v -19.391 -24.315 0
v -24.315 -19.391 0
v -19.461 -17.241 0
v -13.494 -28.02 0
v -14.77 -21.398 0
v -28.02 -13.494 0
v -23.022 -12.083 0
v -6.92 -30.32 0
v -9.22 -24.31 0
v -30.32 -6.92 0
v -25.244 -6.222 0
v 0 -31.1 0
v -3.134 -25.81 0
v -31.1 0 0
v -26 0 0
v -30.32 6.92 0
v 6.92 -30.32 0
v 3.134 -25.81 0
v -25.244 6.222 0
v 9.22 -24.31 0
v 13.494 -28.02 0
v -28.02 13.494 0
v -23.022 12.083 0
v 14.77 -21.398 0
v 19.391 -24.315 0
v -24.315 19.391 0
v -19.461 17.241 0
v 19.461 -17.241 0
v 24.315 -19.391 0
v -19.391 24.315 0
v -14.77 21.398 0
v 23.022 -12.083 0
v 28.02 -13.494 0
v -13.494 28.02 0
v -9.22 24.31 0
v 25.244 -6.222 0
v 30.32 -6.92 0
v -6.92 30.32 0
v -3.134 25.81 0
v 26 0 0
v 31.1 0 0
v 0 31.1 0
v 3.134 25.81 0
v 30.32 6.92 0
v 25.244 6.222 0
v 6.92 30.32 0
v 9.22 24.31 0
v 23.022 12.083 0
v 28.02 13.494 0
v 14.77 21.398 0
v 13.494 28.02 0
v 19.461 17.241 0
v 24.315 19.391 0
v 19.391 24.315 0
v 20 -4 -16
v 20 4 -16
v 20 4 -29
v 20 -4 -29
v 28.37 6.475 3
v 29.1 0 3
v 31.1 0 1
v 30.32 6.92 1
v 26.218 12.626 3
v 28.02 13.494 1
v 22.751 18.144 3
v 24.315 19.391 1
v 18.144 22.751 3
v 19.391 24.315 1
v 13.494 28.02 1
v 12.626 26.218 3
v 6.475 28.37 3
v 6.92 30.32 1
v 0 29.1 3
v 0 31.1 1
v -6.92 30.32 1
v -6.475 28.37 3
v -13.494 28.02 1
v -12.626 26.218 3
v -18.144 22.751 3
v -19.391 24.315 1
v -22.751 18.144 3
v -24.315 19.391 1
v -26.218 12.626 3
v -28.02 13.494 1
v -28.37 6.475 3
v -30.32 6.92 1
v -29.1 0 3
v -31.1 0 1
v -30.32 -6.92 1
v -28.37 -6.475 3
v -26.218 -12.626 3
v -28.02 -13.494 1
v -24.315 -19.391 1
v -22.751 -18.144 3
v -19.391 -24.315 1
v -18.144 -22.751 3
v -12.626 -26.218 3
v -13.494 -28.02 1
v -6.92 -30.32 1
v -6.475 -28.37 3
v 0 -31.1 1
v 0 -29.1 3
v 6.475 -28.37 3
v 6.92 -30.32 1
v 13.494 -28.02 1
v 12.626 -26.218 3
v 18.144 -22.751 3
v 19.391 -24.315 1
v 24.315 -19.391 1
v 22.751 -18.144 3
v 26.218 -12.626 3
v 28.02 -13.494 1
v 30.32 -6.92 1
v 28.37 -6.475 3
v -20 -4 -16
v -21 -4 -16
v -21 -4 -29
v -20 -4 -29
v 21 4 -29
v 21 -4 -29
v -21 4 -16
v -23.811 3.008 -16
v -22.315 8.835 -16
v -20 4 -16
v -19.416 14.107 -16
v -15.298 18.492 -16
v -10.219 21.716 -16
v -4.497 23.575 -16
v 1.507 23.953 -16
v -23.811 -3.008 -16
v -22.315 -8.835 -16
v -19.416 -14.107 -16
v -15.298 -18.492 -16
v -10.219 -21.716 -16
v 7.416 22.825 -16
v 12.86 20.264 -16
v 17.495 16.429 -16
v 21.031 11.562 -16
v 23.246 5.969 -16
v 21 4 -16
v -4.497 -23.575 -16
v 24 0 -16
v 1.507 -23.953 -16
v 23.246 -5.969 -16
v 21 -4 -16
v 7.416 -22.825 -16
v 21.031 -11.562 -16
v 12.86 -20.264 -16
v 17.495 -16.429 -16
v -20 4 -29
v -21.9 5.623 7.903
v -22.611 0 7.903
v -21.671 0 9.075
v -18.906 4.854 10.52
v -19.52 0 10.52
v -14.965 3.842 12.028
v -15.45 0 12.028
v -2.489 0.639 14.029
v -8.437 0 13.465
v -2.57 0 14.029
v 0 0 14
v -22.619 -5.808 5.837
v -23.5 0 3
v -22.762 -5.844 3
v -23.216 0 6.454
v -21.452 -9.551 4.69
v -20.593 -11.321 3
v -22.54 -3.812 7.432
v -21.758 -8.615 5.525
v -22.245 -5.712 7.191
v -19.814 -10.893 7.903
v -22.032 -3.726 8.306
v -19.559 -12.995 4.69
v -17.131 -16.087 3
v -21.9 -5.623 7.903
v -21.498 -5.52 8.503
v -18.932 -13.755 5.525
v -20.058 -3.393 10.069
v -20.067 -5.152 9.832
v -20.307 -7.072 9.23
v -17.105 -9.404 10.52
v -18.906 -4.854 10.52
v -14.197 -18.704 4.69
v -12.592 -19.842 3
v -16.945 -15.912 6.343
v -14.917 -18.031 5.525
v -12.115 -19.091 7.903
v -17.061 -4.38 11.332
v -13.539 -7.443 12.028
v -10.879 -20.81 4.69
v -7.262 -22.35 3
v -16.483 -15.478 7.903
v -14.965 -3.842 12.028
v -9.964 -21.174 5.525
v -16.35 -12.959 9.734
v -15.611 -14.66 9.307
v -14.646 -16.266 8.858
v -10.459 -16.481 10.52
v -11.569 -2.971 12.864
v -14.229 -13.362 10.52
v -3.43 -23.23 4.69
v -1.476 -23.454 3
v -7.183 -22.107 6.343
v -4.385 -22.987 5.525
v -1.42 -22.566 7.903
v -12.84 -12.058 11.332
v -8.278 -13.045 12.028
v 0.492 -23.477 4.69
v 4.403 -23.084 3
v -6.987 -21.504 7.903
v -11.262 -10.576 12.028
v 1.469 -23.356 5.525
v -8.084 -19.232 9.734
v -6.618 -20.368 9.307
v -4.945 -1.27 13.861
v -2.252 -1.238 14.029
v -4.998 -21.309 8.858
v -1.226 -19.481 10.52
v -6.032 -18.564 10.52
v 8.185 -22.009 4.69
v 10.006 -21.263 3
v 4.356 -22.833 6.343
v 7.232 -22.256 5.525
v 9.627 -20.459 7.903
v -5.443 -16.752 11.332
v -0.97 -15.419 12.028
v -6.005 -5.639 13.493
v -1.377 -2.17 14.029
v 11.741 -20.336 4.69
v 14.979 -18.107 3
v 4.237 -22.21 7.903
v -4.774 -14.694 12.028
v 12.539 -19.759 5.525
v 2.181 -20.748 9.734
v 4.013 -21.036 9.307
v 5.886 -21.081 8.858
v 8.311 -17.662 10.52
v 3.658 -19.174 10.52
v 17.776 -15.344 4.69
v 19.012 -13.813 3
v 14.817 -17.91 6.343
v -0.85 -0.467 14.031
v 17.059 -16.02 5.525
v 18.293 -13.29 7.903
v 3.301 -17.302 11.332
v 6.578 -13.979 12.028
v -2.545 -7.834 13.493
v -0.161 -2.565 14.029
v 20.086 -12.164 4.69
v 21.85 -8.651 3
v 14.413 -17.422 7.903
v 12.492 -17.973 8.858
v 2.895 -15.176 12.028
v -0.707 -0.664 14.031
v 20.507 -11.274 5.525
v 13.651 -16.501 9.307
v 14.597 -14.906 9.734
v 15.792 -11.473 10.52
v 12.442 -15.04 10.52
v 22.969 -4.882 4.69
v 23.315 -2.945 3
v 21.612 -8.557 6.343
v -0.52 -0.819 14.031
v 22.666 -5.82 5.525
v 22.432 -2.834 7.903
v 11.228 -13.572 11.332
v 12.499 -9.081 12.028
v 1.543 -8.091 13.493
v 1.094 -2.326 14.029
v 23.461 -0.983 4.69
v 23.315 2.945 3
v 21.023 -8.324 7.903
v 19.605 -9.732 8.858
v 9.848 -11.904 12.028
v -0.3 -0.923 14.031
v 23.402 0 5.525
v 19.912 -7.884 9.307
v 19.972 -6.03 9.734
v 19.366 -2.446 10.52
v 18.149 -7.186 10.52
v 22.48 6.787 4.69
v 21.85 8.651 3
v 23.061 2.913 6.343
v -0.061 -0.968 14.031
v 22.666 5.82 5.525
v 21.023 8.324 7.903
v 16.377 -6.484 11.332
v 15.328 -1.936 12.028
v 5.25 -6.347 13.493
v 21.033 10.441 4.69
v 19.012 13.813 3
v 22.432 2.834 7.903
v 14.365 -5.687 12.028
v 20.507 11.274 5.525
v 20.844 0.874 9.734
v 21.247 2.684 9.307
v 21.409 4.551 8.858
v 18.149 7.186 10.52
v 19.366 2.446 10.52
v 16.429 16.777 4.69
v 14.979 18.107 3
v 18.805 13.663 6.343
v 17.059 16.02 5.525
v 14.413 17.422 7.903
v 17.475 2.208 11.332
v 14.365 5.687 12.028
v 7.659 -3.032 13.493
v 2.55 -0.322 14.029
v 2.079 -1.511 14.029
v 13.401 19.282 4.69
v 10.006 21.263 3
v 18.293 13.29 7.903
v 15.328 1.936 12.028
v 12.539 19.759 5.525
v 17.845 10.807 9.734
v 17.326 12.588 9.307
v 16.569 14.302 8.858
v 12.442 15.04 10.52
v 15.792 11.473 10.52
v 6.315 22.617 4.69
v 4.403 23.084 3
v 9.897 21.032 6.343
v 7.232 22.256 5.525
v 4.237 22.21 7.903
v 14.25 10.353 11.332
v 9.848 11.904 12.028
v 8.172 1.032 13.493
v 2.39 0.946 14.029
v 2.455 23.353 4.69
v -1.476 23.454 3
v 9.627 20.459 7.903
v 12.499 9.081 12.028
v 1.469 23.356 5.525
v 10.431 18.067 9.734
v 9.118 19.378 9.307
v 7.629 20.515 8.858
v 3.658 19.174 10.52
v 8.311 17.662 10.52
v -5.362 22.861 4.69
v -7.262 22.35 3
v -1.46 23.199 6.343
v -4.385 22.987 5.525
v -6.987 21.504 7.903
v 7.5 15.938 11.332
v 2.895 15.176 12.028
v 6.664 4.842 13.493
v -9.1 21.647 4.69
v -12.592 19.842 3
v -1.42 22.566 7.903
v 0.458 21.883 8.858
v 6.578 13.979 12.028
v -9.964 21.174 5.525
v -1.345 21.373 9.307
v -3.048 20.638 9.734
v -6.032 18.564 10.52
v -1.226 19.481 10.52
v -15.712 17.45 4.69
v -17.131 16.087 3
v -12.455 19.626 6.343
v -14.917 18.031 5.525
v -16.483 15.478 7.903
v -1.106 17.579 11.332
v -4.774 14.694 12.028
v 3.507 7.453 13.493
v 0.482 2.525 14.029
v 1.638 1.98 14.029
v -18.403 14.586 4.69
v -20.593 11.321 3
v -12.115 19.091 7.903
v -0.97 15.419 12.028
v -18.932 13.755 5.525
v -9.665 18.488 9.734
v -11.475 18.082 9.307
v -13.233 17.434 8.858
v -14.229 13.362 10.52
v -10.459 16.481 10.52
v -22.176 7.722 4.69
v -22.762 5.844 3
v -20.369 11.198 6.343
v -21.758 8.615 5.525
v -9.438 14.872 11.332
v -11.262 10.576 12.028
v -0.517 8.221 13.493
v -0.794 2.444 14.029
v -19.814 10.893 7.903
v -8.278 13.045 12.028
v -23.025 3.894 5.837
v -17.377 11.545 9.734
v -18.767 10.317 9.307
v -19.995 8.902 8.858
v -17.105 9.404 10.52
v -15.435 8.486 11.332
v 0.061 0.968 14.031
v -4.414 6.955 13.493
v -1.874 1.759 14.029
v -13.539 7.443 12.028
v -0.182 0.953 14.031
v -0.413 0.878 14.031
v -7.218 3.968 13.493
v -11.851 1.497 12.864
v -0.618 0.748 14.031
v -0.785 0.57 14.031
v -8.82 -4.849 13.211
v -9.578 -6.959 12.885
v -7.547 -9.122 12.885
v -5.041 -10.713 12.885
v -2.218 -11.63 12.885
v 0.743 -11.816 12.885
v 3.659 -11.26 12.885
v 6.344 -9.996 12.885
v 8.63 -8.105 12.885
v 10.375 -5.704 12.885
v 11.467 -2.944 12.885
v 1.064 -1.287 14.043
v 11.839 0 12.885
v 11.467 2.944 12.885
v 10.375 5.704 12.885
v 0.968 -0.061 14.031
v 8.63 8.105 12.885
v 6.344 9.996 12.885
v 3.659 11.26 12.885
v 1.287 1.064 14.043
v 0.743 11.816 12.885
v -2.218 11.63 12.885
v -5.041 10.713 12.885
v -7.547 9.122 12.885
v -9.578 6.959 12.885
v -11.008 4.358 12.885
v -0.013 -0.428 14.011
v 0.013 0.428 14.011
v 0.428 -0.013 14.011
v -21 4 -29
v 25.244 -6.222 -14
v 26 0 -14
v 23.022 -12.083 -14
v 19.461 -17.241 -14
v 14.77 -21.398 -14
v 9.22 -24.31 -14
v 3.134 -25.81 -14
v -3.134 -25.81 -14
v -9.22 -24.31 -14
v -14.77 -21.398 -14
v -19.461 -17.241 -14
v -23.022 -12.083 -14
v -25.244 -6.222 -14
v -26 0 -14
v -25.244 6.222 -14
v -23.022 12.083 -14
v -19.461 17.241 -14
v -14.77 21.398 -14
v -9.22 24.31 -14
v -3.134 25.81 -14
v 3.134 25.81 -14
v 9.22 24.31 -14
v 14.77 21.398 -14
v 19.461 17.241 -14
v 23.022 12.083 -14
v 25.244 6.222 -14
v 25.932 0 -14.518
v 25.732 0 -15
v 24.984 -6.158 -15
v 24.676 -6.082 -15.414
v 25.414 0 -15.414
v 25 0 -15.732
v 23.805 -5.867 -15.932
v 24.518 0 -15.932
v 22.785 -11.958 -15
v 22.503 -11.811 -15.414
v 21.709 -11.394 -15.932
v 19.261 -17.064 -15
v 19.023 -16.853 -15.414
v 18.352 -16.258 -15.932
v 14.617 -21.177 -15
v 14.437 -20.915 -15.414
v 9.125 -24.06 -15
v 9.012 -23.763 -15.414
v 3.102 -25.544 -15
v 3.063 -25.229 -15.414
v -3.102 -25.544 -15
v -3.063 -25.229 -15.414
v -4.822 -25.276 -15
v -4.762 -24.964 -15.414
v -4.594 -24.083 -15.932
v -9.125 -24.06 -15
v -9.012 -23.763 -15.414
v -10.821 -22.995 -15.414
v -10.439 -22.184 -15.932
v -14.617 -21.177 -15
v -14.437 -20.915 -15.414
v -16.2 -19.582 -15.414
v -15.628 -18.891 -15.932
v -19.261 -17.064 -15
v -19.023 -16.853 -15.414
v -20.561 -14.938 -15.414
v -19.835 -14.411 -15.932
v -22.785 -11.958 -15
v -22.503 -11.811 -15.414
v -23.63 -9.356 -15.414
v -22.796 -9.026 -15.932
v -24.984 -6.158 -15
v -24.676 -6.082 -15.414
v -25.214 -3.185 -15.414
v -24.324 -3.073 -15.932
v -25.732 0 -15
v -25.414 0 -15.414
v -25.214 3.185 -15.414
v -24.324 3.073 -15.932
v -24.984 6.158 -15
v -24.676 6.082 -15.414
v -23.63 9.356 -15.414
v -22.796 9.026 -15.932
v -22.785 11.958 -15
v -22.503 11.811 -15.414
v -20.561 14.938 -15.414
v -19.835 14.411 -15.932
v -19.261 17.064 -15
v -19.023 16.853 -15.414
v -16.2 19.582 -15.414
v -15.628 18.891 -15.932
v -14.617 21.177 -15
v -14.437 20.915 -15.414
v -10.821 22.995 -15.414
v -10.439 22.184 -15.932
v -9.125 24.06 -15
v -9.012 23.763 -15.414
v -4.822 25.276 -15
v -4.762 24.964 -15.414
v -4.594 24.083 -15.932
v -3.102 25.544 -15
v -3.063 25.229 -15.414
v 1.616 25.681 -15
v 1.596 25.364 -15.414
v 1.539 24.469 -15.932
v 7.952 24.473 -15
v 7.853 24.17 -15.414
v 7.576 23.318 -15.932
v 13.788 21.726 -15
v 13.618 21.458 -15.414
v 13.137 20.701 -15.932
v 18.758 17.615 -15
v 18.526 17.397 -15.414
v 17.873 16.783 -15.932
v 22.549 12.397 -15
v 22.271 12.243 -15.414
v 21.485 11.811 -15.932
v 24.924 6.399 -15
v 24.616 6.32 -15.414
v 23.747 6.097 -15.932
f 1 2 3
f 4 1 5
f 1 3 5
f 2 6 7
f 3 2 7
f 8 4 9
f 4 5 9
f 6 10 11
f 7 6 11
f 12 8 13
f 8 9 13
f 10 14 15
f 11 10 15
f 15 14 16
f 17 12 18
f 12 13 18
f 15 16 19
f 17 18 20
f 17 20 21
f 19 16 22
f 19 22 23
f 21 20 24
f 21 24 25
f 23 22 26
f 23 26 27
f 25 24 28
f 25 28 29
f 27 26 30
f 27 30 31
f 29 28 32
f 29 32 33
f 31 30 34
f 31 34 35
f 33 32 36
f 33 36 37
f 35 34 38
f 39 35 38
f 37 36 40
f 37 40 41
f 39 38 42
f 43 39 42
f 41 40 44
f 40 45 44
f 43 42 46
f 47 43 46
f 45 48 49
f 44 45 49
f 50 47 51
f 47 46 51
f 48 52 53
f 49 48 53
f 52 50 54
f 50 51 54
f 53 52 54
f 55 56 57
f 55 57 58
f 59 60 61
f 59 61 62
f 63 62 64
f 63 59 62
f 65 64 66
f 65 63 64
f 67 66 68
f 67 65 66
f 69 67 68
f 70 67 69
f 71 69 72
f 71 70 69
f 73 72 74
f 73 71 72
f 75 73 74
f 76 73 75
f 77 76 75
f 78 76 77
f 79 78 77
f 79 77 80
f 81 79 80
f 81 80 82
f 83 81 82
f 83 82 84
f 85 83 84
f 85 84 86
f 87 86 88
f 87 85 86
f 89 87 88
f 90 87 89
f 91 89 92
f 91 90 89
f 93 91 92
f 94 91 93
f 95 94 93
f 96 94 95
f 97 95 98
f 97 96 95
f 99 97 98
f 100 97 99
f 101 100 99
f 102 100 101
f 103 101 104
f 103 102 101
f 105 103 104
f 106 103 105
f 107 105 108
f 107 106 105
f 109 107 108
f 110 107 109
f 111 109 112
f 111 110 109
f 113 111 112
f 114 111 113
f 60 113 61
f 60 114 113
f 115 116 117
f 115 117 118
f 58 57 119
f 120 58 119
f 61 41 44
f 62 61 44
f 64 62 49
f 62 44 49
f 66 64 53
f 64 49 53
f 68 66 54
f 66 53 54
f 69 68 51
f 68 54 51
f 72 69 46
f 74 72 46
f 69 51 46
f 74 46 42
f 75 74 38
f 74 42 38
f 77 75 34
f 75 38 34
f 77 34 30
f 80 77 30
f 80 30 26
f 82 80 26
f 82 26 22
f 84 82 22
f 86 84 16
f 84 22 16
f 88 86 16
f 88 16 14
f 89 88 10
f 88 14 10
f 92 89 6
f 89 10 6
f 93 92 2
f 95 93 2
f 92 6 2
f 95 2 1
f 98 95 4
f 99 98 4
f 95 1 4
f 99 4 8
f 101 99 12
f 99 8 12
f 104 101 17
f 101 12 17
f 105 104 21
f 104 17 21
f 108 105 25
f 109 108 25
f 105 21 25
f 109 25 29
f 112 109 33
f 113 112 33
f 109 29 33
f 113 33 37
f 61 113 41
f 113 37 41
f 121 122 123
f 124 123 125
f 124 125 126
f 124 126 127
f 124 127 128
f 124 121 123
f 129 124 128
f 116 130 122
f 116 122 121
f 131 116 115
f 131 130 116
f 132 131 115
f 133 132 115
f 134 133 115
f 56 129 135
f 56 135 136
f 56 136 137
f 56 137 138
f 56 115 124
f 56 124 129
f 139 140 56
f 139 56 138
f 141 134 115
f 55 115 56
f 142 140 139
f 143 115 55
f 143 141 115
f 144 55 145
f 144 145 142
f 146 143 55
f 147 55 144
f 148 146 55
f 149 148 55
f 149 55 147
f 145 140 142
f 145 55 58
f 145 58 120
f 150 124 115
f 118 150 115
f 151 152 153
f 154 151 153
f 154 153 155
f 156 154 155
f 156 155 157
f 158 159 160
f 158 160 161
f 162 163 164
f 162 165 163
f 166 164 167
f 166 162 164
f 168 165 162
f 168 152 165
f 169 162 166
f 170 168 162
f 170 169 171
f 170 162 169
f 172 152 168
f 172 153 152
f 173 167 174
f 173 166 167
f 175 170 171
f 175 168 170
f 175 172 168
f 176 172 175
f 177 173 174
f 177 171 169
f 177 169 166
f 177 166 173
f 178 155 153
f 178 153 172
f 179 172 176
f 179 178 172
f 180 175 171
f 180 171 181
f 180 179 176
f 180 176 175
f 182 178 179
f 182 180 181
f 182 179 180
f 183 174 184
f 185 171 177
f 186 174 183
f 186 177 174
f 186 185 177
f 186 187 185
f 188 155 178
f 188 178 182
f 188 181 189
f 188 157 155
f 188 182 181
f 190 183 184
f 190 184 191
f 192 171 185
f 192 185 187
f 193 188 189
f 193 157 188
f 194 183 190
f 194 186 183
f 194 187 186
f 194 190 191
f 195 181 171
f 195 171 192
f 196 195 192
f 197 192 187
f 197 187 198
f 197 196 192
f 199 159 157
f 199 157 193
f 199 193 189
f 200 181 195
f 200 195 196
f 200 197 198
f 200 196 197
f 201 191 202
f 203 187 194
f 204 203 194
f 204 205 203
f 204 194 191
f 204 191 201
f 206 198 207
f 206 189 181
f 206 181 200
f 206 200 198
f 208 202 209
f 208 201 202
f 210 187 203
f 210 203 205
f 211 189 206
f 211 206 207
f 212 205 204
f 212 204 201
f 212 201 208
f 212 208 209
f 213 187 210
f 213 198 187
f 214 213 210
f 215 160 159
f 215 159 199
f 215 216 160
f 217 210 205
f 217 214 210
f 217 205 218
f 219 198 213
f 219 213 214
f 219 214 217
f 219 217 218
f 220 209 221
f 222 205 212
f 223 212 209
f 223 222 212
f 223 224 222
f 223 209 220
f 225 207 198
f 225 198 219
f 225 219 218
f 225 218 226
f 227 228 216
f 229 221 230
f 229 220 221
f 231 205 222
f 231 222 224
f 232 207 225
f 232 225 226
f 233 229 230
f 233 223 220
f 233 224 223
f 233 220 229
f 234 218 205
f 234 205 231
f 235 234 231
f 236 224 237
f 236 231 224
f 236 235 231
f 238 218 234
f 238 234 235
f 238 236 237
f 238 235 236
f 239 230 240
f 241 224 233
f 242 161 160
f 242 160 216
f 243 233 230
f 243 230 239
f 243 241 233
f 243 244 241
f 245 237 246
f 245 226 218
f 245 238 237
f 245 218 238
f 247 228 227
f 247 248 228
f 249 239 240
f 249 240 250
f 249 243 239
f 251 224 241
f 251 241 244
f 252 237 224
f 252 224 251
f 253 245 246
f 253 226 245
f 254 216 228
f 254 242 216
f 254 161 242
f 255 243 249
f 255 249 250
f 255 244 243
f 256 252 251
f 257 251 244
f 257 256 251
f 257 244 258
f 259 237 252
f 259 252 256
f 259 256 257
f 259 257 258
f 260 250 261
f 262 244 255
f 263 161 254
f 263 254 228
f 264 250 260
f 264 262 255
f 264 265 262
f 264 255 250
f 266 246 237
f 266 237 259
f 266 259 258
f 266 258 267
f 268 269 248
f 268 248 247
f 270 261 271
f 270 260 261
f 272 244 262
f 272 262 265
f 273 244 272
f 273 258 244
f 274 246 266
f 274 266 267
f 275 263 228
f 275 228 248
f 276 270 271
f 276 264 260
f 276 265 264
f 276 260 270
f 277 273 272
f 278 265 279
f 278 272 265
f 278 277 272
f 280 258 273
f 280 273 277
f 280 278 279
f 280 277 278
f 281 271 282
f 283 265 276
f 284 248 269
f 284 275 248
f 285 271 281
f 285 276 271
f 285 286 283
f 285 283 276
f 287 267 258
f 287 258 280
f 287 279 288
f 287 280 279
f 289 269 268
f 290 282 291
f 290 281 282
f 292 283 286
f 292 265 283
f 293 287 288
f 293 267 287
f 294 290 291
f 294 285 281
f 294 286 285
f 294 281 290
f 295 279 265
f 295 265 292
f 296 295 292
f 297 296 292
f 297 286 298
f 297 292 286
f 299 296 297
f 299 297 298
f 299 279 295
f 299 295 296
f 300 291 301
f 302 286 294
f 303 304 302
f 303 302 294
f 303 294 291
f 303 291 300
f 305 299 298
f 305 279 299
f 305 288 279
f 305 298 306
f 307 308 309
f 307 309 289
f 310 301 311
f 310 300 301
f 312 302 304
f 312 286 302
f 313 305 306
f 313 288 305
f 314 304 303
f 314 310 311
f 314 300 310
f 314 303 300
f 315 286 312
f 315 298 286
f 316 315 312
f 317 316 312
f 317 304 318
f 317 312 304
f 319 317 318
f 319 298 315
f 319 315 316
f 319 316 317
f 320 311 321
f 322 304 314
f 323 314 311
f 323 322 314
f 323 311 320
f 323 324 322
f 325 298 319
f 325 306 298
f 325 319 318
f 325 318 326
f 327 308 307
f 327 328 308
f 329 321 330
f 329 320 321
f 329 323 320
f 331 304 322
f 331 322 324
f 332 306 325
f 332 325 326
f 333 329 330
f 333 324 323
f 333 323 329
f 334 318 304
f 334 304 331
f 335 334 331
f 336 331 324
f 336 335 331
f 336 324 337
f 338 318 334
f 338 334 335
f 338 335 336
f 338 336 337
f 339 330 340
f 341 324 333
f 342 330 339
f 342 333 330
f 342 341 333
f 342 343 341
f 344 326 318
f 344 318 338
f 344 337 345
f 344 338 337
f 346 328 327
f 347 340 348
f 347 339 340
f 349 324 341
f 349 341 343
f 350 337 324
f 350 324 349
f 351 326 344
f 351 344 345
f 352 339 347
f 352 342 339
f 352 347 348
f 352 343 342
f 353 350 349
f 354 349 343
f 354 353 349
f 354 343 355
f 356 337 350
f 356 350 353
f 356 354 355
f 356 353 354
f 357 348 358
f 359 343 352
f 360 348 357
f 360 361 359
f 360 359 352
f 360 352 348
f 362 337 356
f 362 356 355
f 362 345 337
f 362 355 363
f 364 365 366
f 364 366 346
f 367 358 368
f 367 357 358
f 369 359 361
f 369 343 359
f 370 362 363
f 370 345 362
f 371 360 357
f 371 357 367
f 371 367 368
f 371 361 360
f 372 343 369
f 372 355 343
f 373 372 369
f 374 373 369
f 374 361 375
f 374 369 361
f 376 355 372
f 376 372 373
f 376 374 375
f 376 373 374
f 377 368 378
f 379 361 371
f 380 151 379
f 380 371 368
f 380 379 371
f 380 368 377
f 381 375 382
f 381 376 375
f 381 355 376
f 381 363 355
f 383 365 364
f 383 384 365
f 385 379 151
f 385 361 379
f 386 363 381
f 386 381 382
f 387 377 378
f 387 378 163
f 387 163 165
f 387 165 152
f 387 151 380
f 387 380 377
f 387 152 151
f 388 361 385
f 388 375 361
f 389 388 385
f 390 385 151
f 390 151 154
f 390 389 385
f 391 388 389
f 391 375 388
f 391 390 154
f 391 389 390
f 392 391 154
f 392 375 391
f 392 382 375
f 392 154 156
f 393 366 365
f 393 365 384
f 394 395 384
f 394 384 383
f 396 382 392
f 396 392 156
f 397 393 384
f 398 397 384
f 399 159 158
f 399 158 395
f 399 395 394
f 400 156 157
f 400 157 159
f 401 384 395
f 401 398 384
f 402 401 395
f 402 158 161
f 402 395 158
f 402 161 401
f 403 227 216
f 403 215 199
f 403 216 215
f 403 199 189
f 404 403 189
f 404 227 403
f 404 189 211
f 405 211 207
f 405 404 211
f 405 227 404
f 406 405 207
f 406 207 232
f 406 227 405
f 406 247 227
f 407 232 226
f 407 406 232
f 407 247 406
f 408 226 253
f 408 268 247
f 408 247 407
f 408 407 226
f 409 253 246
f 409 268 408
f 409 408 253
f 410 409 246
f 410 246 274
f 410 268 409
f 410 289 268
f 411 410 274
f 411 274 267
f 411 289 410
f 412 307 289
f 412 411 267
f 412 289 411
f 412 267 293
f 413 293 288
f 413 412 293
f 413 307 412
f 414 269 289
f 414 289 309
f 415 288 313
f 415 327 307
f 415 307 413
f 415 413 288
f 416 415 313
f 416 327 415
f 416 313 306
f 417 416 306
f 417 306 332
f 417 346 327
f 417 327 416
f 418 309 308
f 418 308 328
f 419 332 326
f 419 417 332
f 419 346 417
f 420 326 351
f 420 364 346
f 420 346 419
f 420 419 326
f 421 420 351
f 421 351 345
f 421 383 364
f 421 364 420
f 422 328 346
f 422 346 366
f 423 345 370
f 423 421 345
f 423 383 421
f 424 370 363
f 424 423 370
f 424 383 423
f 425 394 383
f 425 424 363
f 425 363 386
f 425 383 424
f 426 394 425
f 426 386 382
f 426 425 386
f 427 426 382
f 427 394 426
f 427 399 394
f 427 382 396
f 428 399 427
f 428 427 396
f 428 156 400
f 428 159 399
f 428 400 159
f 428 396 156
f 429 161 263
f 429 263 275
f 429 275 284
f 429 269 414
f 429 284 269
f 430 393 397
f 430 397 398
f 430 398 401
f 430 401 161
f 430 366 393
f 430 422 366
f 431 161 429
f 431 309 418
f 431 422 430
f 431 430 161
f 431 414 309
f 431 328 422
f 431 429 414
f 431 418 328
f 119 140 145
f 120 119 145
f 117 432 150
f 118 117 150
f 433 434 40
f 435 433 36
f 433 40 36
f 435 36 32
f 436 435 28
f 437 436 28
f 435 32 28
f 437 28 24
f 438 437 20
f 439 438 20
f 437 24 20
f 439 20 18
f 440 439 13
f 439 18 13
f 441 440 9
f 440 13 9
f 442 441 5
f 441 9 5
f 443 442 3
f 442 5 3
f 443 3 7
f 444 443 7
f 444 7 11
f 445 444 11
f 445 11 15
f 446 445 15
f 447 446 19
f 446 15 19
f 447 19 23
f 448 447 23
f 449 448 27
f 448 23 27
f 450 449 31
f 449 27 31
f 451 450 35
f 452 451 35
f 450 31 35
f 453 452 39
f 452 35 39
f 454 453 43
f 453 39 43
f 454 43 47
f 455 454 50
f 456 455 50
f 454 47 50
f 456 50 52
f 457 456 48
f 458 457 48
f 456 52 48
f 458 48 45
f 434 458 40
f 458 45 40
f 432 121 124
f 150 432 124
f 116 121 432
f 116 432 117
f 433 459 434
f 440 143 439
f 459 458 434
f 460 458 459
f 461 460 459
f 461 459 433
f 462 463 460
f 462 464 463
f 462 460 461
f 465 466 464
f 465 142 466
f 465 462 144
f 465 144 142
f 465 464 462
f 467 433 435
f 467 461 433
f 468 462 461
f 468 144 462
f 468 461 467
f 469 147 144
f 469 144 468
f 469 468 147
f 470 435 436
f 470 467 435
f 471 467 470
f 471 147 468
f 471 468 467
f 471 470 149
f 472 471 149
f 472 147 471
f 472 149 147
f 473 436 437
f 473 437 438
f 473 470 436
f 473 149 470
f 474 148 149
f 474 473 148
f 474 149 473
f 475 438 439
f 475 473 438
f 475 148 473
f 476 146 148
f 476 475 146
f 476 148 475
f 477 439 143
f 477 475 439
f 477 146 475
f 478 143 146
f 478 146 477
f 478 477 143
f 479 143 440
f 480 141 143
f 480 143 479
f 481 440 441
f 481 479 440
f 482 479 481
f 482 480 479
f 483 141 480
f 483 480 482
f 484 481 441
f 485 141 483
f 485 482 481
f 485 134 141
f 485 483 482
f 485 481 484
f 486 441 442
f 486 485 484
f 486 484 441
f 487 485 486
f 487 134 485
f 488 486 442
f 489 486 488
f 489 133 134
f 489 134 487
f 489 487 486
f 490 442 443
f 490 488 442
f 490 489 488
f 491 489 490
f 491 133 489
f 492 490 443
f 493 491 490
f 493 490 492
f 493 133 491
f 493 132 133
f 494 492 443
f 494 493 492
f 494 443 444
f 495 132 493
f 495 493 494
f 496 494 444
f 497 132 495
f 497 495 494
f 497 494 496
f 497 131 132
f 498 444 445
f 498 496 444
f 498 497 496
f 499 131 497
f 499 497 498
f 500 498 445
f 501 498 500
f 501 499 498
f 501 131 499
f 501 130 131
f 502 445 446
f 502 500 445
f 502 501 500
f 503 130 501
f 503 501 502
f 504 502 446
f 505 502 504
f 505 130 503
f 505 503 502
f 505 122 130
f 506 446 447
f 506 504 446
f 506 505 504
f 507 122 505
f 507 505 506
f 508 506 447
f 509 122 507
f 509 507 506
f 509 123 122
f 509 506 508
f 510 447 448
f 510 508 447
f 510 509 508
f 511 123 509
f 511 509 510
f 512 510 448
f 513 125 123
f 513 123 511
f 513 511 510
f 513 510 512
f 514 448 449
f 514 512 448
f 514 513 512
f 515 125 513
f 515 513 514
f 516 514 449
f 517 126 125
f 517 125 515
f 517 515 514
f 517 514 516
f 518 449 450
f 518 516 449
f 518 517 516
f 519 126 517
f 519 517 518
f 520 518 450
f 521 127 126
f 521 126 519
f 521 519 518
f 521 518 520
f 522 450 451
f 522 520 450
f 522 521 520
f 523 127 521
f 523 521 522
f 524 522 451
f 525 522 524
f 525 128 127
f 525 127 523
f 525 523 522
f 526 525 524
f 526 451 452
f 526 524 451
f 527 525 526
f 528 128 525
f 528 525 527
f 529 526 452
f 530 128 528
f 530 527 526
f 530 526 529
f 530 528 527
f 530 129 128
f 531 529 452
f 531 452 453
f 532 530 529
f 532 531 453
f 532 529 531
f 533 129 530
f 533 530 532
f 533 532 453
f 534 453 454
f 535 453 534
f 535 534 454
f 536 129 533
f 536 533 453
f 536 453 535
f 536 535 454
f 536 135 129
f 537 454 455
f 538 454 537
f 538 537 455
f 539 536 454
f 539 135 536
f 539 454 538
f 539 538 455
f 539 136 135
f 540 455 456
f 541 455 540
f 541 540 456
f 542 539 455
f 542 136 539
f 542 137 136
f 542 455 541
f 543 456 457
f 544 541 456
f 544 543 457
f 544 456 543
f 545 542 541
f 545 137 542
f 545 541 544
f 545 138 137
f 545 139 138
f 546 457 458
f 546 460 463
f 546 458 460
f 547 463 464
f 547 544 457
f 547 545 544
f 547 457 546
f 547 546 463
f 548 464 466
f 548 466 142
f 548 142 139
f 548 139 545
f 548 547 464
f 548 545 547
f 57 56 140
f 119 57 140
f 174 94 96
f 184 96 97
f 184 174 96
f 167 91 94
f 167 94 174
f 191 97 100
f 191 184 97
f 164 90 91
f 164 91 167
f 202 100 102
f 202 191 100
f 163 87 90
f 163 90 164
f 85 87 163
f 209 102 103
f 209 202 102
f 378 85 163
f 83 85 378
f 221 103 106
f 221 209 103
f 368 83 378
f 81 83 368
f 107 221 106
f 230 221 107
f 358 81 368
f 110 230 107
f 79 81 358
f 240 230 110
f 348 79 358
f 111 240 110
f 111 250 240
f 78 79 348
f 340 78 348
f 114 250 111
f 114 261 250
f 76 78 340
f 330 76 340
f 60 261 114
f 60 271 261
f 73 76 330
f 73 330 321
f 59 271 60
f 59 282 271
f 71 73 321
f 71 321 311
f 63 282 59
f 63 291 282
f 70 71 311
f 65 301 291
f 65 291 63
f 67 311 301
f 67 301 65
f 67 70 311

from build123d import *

# Parameters (mm, degrees)
F0_R     = 31.1
F1_DEPTH = 3
F2_SIZE  = 2
F3_R     = 26
F4_DEPTH = 16
F5_R     = 2
F6_W     = 1
F6_H     = 8
F7_DEPTH = 13


with BuildPart() as f1:
    # F0 (on Top) → F1 (new body)
    with BuildSketch(Plane.XY):
        Circle(F0_R)
    extrude(amount=F1_DEPTH)

    # F2
    f2_edges = [f1.edges().sort_by_distance(p)[0] for p in [
        (-31.1, 0, 3),
    ]]
    chamfer(f2_edges, length=F2_SIZE)

    # F3 (on face) → F4 (join)
    with BuildSketch(Plane(origin=(0, 0, 0), x_dir=(1, 0, 0), z_dir=(0, 0, -1))):
        Circle(F3_R)
    extrude(amount=F4_DEPTH)

    # F5
    f5_edges = [f1.edges().sort_by_distance(p)[0] for p in [
        (-26, 0, -16),
    ]]
    fillet(f5_edges, radius=F5_R)

    # F6 (on face) → F7 (join)
    with BuildSketch(Plane(origin=(0, 0, -16), x_dir=(1, 0, 0), z_dir=(0, 0, -1))):
        with Locations((-20.5, 0)):
            Rectangle(F6_W, F6_H)
        with Locations((20.5, 0)):
            Rectangle(F6_W, F6_H)
    extrude(amount=F7_DEPTH)

    # F9 (on Front) → F10 (revolve)
    with BuildSketch(Plane.XZ):
        with BuildLine():
            Line((-23.5, 3), (0, 3))
            Line((0, 3), (0, 14))
            add(Edge.make_bspline(
                [(-23.5, 3), (-23.5445970751, 5.3470100891), (-23.3472398778, 11.6386271394), (-3.4499369243, 14.3252252988), (-0.5936216616, 14), (0, 14)],
                knots=[0, 0, 0, 0, 0.3018049736, 0.7936654017, 1, 1, 1, 1], degree=3))
        make_face()
    revolve(axis=Axis((0, 0, 8.5), (0, 0, 1)))


solid = f1.part
